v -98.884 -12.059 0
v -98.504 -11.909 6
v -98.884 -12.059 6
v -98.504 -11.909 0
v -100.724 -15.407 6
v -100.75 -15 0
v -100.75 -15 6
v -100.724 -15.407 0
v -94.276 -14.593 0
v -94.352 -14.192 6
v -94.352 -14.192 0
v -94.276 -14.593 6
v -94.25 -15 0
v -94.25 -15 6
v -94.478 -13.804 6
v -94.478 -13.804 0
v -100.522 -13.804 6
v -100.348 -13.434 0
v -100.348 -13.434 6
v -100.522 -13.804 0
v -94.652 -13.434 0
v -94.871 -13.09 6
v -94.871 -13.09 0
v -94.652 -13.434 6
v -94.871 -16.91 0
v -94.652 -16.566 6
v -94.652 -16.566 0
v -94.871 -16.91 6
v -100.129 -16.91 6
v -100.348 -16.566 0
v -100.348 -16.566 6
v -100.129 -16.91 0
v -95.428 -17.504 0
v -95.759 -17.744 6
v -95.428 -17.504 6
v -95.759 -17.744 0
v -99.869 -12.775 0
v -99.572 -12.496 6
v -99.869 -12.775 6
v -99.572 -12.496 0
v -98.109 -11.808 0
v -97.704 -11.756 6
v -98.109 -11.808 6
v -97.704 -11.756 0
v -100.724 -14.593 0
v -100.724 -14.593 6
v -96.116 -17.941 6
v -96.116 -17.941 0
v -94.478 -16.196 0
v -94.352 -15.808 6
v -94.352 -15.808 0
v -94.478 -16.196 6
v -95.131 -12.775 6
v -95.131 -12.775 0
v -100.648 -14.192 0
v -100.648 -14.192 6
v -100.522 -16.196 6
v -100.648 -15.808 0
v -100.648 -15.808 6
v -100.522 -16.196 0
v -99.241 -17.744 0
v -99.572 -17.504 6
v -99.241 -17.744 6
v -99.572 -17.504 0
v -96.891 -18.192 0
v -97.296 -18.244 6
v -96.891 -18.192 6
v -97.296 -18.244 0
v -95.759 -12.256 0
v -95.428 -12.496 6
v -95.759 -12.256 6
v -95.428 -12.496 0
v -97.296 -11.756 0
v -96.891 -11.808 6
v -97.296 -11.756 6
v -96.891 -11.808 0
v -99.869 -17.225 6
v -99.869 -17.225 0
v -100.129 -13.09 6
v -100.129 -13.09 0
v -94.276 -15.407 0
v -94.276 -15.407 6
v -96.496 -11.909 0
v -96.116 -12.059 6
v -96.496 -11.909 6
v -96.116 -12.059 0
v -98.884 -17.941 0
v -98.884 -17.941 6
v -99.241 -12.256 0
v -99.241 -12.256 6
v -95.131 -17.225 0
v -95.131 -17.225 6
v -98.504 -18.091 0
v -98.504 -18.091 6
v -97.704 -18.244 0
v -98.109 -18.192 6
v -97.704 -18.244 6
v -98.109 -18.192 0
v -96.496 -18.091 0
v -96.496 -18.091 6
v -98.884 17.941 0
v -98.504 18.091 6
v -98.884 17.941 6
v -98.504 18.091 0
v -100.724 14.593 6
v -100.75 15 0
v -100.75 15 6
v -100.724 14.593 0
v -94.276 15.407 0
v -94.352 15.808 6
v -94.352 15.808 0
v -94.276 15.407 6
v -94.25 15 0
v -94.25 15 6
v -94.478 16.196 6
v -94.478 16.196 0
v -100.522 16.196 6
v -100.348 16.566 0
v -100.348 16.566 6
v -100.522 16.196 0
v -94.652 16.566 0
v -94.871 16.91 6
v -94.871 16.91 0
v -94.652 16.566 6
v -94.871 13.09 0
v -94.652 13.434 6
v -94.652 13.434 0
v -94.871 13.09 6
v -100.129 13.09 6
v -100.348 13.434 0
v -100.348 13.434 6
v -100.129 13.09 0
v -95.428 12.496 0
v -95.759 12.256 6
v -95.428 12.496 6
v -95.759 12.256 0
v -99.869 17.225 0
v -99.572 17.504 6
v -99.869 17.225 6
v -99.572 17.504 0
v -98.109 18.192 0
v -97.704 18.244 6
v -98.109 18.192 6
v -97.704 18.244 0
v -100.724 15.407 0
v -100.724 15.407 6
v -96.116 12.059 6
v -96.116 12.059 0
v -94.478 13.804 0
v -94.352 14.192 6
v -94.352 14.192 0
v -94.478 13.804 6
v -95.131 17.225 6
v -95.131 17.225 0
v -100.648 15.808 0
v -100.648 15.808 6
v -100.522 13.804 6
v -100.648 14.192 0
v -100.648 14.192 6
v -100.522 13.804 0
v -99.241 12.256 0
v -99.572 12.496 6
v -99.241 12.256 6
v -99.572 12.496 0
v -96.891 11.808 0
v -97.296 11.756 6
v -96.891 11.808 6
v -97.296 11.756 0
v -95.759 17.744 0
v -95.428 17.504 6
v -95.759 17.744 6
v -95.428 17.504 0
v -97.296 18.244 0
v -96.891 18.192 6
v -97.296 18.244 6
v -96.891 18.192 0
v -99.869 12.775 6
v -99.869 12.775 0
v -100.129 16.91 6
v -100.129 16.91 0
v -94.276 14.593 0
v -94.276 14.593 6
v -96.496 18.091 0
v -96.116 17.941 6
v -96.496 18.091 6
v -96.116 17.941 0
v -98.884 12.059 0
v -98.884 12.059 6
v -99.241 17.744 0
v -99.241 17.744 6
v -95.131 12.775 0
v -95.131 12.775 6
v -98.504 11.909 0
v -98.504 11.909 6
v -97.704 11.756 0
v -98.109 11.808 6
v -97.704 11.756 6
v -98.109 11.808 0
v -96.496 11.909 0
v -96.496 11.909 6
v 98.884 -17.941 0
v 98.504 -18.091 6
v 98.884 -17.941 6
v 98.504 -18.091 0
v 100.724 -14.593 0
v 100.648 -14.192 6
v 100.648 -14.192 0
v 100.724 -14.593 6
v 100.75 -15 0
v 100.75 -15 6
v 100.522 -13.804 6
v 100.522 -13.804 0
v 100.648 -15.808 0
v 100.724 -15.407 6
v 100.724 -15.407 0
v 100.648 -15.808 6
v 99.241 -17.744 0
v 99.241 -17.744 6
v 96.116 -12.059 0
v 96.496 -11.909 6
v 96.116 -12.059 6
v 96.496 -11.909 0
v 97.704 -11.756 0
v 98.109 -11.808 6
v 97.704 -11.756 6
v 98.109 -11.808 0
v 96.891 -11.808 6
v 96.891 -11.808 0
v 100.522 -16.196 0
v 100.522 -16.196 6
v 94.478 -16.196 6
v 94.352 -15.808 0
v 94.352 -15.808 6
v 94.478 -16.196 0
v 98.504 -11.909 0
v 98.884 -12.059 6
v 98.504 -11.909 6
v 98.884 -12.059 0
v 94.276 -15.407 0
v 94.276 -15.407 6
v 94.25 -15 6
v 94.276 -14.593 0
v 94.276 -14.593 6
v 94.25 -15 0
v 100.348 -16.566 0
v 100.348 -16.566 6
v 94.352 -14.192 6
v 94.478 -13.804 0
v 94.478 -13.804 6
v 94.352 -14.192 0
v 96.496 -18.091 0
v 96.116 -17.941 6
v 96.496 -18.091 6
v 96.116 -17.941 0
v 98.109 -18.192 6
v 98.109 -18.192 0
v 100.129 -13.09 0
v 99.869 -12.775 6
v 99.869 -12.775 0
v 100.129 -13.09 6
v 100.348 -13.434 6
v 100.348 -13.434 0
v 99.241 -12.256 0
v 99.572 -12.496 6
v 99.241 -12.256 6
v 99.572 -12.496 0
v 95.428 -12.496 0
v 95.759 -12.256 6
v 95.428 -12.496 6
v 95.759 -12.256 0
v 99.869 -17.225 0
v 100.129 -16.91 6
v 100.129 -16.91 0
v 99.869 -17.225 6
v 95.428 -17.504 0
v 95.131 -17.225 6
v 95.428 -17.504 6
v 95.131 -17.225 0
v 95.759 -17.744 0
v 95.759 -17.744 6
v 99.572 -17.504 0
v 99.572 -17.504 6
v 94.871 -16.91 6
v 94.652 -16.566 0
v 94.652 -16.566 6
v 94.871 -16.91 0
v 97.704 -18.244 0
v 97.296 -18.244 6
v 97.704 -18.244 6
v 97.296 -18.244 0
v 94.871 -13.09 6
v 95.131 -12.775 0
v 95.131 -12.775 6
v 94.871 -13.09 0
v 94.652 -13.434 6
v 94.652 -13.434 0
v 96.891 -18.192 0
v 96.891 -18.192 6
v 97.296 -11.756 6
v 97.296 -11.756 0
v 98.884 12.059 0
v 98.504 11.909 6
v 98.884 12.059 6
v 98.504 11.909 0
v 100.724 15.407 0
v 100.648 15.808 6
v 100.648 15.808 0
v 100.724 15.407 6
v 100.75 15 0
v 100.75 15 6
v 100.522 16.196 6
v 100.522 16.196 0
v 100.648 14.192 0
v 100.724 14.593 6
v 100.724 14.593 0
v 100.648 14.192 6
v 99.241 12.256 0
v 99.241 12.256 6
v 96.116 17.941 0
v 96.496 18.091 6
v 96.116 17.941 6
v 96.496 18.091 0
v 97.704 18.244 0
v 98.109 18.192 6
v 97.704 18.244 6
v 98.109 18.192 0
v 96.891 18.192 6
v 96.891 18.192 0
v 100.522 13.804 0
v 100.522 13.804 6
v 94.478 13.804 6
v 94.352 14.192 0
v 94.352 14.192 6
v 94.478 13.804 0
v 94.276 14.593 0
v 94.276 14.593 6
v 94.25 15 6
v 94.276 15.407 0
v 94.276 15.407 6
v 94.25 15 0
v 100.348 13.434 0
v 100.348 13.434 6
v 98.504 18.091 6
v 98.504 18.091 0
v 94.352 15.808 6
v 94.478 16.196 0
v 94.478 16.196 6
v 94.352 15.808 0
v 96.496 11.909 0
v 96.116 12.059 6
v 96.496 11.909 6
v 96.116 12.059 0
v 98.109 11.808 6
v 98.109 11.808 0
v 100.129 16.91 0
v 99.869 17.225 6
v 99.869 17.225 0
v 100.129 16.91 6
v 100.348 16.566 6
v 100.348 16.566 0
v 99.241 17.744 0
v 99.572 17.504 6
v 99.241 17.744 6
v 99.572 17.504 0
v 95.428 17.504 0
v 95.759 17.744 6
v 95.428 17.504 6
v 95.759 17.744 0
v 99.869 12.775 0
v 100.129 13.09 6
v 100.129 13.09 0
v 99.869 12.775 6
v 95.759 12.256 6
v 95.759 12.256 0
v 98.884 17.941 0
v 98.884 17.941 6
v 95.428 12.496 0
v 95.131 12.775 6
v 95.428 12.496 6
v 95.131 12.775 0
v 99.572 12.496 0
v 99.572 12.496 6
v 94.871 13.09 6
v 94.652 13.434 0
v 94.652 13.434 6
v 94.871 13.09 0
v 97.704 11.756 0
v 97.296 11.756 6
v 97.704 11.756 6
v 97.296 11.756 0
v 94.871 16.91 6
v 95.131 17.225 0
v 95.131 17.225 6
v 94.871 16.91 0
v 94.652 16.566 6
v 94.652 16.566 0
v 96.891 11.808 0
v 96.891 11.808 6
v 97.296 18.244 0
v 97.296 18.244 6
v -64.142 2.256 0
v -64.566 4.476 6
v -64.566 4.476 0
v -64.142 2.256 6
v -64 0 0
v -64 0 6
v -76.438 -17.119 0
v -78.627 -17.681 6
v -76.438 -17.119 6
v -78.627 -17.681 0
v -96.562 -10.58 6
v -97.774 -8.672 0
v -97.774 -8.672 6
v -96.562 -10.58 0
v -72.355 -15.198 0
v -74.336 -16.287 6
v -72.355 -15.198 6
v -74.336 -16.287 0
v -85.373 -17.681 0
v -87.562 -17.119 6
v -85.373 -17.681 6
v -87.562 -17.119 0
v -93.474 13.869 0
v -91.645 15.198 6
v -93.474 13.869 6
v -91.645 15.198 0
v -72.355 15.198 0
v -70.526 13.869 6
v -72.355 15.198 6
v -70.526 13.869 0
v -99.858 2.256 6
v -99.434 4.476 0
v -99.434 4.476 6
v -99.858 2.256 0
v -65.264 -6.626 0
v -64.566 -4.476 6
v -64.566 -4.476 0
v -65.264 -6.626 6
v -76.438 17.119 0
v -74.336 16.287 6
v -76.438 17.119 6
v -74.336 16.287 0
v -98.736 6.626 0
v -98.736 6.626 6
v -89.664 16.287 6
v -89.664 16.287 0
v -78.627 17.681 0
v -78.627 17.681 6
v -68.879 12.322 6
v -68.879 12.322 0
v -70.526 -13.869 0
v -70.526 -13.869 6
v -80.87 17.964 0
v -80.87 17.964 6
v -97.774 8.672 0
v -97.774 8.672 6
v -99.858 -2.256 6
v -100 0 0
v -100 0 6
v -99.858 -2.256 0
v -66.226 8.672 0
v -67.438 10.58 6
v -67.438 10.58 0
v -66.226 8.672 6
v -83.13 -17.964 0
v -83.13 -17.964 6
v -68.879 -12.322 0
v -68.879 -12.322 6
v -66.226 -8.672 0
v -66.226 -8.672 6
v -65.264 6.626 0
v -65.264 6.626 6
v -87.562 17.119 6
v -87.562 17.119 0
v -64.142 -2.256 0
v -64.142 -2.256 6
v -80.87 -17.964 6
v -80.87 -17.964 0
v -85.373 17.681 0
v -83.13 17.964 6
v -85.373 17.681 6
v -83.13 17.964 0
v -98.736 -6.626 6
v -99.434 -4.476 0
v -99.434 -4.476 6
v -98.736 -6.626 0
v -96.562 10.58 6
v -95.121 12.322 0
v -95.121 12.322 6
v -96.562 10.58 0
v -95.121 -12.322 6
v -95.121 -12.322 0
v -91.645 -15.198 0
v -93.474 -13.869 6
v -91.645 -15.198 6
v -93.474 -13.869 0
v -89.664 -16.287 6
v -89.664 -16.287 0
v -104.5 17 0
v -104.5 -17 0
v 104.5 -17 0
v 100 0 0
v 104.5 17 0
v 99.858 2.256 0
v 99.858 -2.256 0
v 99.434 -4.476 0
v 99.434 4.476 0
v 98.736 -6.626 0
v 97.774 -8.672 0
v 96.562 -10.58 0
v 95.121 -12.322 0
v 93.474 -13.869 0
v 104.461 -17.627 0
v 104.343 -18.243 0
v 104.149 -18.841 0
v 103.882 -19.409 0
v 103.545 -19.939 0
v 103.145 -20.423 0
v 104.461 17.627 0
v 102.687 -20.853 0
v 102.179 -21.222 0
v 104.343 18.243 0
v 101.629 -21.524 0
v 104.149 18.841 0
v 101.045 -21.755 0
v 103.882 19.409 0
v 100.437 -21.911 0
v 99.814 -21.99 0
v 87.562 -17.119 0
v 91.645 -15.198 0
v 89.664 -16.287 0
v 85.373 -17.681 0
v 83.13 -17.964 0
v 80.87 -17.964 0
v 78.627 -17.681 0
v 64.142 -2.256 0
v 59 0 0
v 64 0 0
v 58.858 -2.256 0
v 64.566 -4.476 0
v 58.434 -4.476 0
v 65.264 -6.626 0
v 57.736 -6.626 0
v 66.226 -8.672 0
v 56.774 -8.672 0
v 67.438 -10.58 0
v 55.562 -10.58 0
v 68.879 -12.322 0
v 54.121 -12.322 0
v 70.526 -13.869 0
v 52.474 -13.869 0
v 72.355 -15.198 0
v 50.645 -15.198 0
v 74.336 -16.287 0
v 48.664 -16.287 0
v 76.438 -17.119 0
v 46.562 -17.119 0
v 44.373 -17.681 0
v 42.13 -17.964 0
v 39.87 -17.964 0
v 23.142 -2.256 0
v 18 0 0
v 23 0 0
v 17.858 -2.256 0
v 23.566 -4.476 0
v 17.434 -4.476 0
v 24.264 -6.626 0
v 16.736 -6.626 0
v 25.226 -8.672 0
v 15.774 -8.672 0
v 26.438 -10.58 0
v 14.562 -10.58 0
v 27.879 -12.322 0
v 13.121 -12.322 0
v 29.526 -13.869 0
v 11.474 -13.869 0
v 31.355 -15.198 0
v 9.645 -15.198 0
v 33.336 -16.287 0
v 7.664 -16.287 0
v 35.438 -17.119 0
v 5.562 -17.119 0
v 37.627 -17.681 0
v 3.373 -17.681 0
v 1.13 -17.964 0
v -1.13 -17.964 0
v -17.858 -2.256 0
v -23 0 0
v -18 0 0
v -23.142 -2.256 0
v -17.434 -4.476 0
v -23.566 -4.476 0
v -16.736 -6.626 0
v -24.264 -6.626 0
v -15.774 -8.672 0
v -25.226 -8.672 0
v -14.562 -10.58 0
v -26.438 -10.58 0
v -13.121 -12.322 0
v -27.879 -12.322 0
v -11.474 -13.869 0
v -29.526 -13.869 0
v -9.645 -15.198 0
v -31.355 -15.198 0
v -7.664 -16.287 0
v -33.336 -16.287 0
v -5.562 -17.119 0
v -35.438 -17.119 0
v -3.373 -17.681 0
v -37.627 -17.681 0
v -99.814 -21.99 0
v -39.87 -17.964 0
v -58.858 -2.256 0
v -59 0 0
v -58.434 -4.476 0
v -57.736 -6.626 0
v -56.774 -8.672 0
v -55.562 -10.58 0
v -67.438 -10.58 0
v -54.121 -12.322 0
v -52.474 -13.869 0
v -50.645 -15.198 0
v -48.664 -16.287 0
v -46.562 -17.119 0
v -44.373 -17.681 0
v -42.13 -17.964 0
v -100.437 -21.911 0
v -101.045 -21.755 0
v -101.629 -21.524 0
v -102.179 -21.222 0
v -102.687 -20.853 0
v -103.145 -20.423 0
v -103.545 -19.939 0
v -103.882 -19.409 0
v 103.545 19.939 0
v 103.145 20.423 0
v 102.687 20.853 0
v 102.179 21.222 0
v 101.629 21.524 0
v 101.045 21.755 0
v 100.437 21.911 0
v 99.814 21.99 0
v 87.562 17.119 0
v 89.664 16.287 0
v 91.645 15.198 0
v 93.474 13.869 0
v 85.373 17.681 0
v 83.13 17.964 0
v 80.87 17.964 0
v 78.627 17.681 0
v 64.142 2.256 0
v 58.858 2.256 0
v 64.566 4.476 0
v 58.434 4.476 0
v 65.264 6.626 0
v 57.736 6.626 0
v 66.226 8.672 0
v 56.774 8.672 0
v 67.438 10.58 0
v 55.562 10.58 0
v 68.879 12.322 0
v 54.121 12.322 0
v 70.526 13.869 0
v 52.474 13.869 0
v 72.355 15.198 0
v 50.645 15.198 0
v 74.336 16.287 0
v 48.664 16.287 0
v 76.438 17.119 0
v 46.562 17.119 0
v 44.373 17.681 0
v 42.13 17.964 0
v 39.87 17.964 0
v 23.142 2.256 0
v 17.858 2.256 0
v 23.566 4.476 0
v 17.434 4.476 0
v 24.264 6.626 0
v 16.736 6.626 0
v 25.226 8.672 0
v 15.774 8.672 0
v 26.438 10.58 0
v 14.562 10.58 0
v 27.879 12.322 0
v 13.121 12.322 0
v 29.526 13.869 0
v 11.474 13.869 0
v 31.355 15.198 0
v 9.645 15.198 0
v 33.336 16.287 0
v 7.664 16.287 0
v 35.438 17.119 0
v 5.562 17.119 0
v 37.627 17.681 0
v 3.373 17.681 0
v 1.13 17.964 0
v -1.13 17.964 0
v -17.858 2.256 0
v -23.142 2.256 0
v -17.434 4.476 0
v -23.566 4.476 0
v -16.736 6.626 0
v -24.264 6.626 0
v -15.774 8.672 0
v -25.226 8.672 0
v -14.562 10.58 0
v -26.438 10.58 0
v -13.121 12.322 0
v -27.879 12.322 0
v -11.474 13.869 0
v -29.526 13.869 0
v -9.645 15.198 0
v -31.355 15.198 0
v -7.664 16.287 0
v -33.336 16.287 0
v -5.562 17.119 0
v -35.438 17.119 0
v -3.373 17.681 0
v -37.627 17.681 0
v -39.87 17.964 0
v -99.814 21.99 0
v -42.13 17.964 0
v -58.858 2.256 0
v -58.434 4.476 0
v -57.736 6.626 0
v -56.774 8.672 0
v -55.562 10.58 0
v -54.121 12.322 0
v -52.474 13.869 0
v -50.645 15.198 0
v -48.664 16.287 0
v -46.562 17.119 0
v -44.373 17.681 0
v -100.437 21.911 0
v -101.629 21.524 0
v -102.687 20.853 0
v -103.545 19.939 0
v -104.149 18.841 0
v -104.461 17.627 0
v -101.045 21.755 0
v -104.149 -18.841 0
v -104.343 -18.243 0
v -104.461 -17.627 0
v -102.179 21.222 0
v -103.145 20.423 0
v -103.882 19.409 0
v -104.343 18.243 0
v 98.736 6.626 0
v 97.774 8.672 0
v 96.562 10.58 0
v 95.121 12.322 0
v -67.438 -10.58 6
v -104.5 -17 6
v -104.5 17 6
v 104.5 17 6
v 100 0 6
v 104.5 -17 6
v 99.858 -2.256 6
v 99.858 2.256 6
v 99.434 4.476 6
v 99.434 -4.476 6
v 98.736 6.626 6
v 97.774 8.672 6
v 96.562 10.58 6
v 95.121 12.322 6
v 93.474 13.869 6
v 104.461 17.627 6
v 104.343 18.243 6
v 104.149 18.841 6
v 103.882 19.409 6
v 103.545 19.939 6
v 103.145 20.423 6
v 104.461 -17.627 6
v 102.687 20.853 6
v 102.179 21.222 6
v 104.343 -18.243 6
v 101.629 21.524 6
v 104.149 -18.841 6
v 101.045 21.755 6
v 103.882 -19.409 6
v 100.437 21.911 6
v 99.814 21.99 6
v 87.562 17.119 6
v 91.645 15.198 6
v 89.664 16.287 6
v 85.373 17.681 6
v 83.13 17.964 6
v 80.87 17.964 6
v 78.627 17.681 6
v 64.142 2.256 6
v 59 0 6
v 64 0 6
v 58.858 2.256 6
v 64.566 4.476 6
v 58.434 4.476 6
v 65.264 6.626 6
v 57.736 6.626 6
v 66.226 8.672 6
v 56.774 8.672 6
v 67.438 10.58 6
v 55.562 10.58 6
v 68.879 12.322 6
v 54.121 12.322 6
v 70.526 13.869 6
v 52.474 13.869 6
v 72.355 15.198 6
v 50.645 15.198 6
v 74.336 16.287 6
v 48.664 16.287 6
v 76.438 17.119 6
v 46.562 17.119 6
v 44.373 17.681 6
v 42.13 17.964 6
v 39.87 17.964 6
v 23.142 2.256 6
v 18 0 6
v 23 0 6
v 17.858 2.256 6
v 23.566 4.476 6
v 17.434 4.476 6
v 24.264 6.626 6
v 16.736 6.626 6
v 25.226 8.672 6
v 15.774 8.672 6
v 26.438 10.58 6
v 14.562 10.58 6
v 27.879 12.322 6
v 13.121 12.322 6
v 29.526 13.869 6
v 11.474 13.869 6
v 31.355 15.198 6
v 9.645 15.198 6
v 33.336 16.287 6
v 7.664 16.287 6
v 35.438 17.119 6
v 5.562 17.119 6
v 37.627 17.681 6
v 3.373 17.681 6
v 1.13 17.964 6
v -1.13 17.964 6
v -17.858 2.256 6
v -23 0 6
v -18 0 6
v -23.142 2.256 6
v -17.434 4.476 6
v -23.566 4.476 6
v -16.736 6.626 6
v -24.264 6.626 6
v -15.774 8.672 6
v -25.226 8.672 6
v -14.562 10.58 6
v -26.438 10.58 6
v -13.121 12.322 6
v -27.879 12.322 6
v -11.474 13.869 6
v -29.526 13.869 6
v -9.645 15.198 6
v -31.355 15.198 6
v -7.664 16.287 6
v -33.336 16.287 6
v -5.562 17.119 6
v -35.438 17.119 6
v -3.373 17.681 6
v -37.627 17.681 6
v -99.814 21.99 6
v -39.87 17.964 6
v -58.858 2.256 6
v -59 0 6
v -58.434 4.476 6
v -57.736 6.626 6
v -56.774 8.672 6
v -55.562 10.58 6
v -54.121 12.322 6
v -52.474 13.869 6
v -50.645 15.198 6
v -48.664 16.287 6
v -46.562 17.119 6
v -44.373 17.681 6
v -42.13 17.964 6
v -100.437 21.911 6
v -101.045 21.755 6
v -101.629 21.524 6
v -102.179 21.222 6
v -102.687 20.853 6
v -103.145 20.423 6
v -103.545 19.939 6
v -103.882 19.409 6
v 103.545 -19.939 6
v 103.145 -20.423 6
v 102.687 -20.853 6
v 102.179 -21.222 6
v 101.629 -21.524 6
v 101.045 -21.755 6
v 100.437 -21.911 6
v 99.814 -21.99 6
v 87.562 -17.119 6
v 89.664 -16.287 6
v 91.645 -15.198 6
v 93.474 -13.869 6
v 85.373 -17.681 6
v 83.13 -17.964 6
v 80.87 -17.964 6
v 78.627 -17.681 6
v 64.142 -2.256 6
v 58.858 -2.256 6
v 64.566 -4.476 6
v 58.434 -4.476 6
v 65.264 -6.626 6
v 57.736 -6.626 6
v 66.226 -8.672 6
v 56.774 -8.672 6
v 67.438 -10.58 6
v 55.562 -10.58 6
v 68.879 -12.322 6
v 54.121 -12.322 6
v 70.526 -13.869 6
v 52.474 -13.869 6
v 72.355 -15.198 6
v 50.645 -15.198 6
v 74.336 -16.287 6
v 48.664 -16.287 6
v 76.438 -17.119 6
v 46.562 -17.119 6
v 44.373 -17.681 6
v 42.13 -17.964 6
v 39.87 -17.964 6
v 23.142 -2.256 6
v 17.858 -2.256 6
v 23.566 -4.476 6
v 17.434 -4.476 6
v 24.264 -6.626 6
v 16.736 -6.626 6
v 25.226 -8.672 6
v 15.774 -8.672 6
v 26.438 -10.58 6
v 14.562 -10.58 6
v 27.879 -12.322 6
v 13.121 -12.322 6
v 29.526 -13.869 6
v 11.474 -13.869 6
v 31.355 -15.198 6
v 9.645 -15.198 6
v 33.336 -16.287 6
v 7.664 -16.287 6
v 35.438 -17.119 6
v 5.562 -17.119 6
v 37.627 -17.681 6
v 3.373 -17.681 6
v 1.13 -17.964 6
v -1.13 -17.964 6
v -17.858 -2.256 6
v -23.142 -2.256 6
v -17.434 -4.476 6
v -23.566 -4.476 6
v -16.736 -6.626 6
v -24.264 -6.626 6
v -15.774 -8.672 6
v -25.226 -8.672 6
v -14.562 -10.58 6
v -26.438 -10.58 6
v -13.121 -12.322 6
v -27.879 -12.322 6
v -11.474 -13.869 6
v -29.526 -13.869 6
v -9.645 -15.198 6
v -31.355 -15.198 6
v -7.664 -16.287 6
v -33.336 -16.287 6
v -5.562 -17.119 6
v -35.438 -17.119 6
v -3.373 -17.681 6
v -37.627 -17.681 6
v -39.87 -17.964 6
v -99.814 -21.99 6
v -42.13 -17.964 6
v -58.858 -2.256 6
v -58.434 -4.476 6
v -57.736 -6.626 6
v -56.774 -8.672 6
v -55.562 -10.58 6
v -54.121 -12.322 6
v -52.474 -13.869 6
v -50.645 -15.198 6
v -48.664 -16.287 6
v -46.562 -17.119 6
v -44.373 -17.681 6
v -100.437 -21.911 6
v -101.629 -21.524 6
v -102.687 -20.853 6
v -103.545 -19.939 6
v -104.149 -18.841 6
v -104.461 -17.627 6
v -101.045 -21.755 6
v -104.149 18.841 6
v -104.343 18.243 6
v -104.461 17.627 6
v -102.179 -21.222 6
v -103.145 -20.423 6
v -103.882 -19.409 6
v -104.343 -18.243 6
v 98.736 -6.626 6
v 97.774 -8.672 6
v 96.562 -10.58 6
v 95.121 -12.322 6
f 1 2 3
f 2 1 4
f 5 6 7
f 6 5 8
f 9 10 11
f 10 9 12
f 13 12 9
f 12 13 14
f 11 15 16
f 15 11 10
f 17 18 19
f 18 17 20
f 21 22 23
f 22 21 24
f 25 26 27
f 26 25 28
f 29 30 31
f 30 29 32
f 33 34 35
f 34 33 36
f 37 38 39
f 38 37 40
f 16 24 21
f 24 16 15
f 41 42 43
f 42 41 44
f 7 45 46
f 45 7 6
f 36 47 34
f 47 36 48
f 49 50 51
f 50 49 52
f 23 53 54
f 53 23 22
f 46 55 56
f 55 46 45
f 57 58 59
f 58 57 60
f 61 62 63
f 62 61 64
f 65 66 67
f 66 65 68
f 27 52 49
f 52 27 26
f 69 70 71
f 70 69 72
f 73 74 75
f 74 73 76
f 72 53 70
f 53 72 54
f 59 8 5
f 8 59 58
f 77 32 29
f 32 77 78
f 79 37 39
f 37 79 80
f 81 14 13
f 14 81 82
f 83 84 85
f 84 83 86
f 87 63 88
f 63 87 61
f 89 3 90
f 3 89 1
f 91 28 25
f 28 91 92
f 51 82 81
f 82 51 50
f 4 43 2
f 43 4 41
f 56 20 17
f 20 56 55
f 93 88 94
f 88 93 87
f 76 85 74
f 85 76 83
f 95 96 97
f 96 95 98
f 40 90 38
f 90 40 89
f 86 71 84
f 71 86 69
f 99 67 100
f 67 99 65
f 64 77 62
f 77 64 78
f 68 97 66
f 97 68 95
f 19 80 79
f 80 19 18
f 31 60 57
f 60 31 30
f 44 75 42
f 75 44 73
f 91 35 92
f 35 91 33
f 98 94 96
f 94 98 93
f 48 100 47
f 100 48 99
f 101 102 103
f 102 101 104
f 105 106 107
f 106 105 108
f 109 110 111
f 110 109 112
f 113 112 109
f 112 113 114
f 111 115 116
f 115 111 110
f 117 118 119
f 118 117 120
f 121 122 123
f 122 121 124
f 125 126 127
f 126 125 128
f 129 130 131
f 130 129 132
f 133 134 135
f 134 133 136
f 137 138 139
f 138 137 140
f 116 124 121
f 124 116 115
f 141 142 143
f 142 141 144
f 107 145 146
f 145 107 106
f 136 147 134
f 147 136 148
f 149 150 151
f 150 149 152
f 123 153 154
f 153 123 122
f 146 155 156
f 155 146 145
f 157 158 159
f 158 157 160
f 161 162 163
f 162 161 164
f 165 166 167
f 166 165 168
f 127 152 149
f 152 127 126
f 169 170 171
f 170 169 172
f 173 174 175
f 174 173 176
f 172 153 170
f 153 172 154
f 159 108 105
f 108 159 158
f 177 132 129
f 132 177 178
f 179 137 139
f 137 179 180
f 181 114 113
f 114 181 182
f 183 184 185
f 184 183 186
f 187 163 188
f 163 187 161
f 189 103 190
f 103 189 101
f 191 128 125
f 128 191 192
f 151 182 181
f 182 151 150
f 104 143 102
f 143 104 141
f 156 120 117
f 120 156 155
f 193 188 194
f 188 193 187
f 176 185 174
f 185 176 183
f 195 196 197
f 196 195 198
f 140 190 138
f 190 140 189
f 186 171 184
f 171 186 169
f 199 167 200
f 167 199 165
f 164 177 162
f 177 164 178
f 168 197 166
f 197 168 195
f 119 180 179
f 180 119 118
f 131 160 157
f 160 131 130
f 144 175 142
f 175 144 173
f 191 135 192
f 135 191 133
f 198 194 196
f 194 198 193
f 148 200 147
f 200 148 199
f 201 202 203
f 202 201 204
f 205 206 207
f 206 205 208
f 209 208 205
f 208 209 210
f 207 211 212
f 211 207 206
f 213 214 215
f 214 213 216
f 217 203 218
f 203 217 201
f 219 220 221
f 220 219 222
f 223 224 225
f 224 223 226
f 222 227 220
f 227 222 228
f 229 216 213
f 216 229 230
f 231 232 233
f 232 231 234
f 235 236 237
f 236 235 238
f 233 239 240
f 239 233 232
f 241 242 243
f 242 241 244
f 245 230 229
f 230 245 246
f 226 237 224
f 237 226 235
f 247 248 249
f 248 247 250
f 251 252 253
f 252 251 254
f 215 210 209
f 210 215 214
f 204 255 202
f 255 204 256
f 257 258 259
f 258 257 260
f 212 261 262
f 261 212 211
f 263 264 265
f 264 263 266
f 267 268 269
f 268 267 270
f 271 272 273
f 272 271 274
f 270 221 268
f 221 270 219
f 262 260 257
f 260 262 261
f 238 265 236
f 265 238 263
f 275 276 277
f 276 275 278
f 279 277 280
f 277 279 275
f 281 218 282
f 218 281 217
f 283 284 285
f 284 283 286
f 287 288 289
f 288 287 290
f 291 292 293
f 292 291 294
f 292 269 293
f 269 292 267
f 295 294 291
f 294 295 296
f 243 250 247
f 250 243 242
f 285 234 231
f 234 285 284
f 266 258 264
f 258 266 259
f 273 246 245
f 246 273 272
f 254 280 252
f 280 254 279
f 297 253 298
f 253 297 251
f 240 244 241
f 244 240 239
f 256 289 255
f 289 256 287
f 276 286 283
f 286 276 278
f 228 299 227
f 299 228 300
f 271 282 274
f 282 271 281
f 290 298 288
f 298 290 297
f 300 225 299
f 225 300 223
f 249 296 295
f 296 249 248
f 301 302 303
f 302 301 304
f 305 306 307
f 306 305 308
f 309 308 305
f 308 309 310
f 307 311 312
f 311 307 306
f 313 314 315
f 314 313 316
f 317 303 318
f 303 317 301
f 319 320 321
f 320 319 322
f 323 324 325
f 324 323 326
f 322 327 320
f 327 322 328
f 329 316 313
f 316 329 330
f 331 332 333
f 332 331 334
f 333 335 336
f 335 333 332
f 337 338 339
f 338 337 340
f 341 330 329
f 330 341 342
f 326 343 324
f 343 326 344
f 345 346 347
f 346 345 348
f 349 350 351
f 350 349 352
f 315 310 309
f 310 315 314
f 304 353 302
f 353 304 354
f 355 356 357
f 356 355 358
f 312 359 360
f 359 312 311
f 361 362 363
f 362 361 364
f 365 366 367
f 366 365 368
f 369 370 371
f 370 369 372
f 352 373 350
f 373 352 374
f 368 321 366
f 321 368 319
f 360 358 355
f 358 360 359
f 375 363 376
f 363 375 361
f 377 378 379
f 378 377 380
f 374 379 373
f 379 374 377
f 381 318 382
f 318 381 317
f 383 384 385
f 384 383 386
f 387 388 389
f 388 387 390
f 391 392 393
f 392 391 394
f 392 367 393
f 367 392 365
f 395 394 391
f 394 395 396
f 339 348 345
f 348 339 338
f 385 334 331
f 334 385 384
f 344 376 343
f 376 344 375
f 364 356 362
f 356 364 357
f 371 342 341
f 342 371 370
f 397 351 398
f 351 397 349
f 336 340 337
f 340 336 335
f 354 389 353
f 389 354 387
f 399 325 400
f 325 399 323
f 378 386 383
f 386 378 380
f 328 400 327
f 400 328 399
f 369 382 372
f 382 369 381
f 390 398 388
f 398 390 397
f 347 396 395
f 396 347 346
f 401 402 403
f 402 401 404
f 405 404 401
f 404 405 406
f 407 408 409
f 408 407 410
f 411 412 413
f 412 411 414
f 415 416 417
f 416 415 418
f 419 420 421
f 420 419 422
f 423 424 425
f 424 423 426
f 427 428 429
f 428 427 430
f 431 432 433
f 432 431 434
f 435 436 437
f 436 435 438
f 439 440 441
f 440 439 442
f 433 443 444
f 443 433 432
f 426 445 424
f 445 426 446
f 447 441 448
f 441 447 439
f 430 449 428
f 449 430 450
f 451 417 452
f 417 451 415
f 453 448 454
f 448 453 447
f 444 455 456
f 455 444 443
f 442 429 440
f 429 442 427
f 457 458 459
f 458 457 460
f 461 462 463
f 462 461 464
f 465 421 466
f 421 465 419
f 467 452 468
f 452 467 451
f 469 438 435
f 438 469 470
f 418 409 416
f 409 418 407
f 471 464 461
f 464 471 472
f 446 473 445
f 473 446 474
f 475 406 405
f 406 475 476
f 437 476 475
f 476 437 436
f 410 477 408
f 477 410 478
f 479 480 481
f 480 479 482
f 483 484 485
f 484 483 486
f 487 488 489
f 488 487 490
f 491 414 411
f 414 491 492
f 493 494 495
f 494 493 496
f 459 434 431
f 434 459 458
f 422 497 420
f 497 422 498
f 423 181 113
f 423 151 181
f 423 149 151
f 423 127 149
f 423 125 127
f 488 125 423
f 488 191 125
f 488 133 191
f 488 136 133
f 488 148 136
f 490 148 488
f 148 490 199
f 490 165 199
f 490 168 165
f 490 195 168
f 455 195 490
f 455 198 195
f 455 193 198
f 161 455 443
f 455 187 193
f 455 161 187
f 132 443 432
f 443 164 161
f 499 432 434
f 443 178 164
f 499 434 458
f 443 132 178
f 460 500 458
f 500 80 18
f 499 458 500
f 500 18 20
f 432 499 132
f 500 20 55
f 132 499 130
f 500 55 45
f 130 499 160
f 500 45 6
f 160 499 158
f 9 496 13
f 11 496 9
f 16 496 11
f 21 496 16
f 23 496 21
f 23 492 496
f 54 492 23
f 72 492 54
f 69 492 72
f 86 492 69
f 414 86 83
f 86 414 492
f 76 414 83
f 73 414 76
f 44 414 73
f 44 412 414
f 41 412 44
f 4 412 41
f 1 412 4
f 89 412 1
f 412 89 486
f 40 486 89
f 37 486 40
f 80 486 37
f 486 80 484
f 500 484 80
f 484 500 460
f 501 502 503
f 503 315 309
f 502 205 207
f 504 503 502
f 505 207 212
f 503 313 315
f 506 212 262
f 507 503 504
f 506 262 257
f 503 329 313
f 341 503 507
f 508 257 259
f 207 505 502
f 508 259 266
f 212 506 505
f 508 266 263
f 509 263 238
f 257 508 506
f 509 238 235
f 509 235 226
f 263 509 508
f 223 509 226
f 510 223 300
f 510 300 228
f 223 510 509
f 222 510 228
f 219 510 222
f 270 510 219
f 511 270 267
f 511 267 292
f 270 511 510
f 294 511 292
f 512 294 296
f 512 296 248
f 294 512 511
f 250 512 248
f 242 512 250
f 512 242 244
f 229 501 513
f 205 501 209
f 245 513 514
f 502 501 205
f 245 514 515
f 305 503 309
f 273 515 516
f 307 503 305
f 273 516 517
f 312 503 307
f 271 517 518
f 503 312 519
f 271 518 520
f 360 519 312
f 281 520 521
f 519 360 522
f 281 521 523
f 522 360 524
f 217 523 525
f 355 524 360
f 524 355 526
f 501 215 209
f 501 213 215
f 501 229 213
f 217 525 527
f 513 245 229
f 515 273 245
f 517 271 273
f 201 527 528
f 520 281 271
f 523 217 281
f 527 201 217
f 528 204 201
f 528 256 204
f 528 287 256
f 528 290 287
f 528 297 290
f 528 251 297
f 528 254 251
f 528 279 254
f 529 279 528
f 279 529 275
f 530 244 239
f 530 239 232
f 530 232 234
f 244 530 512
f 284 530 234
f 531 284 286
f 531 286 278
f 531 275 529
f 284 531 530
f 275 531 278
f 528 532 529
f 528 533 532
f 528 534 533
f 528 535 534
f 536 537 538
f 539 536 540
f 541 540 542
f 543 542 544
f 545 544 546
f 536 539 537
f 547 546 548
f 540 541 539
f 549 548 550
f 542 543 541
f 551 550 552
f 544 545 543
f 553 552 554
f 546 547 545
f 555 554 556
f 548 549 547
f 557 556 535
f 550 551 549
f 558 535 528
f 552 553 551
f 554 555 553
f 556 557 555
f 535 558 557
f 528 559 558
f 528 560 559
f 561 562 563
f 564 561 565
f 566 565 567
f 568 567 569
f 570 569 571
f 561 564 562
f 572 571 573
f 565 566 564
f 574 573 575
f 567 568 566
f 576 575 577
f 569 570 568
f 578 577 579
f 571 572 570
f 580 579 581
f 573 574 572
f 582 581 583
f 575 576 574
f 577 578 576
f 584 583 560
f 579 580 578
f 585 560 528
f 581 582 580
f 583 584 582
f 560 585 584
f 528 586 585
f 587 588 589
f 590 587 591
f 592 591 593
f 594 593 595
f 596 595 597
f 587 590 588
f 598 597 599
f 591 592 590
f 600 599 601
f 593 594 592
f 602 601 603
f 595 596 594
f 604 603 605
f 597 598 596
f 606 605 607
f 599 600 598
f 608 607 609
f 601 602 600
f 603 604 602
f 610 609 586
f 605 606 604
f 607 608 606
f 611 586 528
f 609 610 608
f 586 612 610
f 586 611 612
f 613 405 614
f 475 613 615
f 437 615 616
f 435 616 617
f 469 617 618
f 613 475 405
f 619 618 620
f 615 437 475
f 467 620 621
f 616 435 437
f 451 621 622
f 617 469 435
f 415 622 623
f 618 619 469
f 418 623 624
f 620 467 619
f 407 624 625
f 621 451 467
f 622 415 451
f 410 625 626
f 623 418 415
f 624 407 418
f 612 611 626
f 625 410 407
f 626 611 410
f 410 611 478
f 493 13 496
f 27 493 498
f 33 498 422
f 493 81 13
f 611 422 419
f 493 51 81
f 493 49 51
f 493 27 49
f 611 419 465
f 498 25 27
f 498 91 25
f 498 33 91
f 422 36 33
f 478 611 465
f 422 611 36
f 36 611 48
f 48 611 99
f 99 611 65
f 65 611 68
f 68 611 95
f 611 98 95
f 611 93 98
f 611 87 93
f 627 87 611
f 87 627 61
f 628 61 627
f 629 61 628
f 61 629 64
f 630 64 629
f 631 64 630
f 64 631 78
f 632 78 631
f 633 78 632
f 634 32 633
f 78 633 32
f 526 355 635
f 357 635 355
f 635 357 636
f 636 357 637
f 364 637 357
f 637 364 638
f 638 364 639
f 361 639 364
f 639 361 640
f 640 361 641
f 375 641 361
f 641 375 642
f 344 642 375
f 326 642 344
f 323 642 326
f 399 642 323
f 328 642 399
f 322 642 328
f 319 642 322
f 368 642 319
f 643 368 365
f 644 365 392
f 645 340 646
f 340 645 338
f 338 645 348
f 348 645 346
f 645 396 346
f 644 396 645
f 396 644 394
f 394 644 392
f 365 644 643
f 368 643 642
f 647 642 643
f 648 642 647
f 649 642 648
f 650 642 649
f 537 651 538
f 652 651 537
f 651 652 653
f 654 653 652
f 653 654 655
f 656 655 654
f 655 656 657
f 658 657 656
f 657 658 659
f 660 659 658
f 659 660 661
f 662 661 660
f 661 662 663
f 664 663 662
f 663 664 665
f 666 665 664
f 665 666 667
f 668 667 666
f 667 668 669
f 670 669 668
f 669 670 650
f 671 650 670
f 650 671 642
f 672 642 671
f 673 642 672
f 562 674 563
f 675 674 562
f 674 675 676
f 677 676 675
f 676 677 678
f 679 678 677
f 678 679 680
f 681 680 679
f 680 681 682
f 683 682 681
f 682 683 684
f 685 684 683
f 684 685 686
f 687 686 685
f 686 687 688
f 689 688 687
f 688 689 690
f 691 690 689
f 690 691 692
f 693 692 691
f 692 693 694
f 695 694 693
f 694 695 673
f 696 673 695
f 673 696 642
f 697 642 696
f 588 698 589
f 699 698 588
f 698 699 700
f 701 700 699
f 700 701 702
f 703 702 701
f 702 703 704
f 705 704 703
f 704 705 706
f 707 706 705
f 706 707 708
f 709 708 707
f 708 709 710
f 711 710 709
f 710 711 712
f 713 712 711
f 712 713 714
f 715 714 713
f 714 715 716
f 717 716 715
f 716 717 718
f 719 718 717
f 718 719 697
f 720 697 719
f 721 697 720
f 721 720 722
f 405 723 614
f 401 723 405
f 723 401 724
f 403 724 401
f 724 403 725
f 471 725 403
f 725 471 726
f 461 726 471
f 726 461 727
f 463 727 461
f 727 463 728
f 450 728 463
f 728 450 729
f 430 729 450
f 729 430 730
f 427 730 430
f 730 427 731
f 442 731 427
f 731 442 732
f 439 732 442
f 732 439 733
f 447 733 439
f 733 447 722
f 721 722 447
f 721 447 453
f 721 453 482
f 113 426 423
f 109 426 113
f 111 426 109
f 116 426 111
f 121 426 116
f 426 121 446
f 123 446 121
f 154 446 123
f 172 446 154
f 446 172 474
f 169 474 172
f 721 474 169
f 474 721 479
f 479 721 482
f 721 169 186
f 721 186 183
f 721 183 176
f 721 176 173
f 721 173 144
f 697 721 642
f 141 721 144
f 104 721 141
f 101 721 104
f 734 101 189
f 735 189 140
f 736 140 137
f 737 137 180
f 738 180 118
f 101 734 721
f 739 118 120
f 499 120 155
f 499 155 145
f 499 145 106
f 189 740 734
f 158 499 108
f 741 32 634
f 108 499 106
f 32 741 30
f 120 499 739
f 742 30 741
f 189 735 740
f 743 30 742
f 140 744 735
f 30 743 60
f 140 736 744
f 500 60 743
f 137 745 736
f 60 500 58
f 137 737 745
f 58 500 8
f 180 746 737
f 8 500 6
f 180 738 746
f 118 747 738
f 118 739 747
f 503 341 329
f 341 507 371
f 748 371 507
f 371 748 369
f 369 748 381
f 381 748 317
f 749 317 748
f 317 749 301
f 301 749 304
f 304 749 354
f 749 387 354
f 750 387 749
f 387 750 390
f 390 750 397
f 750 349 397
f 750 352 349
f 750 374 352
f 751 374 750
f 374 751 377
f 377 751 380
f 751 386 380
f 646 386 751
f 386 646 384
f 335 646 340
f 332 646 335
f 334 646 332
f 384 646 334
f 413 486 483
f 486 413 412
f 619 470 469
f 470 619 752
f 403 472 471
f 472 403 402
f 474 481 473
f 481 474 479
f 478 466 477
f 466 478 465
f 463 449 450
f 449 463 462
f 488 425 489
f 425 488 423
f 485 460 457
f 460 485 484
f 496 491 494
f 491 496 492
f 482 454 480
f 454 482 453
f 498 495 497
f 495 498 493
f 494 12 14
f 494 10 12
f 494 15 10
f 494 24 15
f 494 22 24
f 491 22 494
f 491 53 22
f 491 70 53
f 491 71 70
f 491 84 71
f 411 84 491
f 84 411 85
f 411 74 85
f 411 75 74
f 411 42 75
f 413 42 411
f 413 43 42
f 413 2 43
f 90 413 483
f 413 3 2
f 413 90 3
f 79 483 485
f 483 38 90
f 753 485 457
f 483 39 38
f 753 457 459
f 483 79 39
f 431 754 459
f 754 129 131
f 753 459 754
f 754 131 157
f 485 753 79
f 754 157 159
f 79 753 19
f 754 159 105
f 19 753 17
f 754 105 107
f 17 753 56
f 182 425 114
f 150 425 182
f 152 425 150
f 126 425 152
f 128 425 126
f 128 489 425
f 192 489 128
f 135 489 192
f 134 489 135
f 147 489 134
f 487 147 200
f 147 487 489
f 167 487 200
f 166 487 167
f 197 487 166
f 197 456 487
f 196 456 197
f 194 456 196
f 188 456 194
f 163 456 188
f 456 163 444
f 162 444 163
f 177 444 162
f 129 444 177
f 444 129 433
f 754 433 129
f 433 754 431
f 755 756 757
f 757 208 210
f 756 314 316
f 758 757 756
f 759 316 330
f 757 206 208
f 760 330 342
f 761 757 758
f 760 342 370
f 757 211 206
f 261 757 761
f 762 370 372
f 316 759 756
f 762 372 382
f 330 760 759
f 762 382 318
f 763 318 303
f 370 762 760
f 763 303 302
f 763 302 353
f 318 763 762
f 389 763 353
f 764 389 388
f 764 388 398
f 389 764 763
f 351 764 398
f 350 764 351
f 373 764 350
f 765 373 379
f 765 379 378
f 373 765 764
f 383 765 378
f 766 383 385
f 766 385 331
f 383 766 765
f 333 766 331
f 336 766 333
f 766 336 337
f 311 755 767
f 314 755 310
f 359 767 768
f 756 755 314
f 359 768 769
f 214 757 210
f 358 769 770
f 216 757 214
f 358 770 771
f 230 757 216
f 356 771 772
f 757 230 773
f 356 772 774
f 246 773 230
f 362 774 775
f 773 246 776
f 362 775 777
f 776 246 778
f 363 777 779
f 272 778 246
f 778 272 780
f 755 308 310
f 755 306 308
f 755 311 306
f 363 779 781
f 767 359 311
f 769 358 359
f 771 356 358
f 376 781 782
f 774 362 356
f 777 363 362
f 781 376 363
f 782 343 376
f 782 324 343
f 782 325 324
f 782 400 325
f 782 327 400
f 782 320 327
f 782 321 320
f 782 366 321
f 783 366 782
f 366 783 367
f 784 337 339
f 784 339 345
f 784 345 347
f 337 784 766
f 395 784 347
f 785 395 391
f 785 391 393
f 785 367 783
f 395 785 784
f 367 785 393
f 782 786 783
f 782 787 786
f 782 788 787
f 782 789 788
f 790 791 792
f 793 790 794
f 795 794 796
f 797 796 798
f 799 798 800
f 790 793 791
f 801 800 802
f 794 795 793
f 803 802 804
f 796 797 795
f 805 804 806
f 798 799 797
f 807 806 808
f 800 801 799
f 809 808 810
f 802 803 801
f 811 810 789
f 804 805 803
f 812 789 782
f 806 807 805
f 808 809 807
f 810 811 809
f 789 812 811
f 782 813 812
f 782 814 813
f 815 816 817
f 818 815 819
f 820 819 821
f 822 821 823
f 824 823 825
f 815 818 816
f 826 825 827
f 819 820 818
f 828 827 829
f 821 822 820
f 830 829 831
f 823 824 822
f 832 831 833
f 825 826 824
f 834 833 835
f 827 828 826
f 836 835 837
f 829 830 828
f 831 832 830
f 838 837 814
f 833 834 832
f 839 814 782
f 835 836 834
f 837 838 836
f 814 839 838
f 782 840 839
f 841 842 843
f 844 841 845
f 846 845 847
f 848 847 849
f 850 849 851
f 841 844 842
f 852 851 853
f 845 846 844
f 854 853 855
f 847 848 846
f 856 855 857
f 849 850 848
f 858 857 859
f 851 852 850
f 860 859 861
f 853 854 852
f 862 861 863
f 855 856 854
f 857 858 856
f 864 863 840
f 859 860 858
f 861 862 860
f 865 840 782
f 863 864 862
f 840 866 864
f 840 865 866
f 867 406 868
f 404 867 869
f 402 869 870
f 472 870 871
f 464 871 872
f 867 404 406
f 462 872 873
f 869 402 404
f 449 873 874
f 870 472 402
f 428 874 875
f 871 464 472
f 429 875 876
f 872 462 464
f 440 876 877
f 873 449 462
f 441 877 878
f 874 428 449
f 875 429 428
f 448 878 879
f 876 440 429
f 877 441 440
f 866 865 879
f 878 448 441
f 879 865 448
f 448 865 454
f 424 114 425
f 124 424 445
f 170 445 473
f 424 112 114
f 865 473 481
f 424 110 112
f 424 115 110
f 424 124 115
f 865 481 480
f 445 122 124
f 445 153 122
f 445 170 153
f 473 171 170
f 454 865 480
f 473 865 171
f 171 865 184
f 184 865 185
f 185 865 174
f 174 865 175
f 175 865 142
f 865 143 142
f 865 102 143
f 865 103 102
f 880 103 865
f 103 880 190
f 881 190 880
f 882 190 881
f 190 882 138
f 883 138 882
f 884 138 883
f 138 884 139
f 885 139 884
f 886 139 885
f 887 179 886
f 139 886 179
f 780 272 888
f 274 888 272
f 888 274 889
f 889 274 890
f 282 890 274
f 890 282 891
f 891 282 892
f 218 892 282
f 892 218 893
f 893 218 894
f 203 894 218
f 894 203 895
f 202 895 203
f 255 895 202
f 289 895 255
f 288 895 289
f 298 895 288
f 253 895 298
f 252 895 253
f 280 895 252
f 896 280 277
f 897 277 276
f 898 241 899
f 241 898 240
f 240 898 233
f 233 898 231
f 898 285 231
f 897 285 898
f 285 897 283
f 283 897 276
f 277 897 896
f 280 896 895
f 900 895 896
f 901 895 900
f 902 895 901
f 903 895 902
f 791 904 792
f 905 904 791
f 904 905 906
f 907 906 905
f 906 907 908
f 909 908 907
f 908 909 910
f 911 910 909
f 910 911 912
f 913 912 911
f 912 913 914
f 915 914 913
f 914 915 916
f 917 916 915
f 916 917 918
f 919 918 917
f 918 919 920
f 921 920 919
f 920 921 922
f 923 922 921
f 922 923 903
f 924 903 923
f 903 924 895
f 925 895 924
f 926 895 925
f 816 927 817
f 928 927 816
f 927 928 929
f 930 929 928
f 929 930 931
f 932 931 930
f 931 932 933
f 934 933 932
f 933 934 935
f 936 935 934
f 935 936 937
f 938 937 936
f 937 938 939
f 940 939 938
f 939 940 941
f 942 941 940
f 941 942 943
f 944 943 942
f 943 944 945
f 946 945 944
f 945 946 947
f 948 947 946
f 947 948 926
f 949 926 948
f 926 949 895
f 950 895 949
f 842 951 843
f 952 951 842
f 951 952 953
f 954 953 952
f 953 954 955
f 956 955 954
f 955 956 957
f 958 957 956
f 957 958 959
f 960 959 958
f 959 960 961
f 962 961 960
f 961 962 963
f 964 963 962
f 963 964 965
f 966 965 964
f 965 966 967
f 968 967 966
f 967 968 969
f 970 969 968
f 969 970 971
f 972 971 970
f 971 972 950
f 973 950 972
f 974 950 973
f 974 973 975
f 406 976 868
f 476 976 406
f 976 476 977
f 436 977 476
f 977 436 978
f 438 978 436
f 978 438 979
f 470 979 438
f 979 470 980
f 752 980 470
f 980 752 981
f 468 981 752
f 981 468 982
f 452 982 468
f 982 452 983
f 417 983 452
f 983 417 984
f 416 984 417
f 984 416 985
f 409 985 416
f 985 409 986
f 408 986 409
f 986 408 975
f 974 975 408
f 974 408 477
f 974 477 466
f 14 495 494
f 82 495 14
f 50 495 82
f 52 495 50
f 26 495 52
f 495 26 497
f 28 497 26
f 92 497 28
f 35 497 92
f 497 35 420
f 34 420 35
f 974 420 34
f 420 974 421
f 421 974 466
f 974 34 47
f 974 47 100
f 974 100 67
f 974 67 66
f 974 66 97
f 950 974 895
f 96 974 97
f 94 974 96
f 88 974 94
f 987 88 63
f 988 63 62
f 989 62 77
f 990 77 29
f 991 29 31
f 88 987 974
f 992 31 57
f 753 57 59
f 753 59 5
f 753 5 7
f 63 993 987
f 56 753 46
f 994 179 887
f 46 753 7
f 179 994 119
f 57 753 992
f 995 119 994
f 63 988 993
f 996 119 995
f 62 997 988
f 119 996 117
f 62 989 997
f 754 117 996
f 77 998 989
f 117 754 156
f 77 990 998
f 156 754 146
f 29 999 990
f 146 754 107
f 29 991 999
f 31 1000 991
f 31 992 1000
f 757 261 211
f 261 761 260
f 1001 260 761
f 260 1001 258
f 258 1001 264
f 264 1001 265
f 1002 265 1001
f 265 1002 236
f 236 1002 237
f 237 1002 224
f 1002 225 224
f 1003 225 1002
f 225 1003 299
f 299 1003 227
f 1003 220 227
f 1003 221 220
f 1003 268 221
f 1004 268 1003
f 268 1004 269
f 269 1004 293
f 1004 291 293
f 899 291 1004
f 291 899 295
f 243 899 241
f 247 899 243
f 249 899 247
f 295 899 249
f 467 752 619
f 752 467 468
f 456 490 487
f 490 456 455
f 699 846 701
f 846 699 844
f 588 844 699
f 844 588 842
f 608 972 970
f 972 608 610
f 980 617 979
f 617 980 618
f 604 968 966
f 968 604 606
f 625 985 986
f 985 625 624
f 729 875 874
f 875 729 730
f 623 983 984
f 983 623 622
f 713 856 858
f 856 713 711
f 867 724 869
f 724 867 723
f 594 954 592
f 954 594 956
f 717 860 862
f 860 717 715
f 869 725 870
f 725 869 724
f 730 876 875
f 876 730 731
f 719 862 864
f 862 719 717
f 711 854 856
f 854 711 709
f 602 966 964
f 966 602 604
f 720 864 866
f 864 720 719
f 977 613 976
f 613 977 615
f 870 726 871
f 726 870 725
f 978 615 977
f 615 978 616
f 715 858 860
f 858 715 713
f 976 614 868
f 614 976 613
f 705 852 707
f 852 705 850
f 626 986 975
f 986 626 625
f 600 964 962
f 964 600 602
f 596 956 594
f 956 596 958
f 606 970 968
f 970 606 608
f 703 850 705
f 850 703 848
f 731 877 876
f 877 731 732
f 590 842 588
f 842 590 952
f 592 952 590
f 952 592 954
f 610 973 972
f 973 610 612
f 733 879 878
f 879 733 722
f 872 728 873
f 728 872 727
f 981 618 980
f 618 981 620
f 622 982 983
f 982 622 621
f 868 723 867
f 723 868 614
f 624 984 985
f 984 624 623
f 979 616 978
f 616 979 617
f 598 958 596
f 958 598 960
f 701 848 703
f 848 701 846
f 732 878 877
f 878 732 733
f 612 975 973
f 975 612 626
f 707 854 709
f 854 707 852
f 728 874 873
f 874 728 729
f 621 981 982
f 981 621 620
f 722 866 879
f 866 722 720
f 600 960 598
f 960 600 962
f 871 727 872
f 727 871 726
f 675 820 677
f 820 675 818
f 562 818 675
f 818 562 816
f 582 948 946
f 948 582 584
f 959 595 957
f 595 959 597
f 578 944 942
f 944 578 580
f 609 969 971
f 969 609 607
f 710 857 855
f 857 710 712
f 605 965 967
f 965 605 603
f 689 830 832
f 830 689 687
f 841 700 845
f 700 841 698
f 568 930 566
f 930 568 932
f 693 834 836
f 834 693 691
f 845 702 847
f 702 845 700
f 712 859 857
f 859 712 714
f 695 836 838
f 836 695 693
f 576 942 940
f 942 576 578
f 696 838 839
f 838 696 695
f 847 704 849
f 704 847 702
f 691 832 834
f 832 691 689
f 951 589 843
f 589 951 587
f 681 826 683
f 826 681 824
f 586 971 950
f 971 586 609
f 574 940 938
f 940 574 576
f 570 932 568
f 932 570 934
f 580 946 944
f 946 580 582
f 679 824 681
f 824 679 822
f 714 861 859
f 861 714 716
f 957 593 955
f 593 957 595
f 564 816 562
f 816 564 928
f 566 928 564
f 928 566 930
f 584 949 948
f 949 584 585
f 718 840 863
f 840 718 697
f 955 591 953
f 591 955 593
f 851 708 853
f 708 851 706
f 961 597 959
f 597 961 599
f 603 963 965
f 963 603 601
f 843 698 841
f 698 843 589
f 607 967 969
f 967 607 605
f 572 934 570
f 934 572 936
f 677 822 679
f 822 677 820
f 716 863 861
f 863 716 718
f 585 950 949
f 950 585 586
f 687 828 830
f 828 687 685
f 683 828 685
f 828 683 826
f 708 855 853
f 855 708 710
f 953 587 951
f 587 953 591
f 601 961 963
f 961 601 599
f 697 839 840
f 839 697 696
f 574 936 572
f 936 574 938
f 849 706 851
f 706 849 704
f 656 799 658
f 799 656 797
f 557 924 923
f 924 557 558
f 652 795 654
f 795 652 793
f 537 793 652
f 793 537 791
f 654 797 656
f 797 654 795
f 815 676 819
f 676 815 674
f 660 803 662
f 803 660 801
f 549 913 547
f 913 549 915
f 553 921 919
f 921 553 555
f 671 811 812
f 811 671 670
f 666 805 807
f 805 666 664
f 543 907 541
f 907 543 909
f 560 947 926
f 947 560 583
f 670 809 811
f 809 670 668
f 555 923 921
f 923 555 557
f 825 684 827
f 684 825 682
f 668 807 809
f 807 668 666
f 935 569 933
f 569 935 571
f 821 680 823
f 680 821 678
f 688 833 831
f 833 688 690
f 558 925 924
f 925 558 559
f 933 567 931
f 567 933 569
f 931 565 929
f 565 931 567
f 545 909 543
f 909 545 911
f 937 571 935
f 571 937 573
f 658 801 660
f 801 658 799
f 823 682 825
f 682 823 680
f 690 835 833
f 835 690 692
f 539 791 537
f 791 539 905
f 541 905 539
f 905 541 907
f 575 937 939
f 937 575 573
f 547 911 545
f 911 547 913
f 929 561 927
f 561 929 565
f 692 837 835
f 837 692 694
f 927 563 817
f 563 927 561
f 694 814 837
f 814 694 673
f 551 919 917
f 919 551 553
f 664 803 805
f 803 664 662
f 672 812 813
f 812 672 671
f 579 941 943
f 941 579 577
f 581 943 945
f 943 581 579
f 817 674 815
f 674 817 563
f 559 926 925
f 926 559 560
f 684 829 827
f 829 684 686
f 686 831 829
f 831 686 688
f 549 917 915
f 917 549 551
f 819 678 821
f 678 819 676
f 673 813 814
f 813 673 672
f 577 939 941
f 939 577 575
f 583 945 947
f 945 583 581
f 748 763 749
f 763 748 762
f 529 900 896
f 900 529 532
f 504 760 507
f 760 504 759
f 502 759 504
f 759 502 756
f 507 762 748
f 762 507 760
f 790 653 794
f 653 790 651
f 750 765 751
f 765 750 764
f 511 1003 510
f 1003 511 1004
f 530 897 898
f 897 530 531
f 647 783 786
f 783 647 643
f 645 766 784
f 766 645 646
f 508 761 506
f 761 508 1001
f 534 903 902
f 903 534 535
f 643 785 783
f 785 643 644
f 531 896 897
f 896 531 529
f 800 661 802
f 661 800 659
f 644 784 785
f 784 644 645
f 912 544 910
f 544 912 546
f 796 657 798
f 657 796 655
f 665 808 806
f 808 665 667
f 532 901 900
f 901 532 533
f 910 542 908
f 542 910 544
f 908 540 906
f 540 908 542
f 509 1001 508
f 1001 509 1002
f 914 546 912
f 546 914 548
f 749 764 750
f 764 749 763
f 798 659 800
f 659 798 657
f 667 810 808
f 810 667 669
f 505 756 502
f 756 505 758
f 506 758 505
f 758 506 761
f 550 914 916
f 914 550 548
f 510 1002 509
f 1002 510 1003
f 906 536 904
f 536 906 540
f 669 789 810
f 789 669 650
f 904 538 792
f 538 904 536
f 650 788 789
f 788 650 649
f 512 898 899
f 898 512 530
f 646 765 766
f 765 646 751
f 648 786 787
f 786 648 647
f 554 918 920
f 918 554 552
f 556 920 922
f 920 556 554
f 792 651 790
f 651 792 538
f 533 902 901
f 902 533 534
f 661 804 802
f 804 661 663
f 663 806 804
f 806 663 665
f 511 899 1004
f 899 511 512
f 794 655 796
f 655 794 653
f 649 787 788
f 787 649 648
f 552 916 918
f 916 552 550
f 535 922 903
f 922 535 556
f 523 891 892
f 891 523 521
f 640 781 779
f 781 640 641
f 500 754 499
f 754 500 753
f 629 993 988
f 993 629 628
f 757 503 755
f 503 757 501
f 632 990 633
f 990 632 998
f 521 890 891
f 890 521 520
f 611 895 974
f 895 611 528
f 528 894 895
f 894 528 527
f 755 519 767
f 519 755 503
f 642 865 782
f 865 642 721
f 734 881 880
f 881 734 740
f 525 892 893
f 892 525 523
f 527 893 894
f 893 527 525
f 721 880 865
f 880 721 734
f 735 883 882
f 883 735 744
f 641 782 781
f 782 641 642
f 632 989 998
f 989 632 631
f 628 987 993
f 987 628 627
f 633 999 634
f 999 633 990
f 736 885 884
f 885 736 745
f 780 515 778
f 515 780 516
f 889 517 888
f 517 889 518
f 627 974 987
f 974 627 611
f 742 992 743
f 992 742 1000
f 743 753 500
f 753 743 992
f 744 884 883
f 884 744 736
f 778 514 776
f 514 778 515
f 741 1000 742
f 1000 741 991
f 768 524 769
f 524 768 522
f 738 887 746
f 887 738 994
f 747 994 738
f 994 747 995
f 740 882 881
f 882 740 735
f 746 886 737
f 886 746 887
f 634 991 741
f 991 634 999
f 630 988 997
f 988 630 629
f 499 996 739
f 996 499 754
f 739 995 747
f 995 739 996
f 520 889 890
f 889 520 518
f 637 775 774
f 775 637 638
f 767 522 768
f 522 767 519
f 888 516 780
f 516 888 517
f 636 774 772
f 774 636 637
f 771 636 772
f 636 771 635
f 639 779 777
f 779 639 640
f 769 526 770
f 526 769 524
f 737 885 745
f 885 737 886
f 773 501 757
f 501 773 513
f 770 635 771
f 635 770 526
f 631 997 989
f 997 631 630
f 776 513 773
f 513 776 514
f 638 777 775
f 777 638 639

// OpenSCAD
$fn = 50;


difference() {
	union() {
		hull() {
			translate(v = [-99.5000000000, 17.0000000000, 0]) {
				cylinder(h = 6, r = 5);
			}
			translate(v = [99.5000000000, 17.0000000000, 0]) {
				cylinder(h = 6, r = 5);
			}
			translate(v = [-99.5000000000, -17.0000000000, 0]) {
				cylinder(h = 6, r = 5);
			}
			translate(v = [99.5000000000, -17.0000000000, 0]) {
				cylinder(h = 6, r = 5);
			}
		}
	}
	union() {
		#translate(v = [-97.5000000000, -15.0000000000, -100.0000000000]) {
			cylinder(h = 200, r = 3.2500000000);
		}
		#translate(v = [-97.5000000000, 15.0000000000, -100.0000000000]) {
			cylinder(h = 200, r = 3.2500000000);
		}
		#translate(v = [97.5000000000, -15.0000000000, -100.0000000000]) {
			cylinder(h = 200, r = 3.2500000000);
		}
		#translate(v = [97.5000000000, 15.0000000000, -100.0000000000]) {
			cylinder(h = 200, r = 3.2500000000);
		}
		#translate(v = [-82.0000000000, 0, 0]) {
			cylinder(h = 6, r = 18.0000000000);
		}
		#translate(v = [-41.0000000000, 0, 0]) {
			cylinder(h = 6, r = 18.0000000000);
		}
		#cylinder(h = 6, r = 18.0000000000);
		#translate(v = [41.0000000000, 0, 0]) {
			cylinder(h = 6, r = 18.0000000000);
		}
		#translate(v = [82.0000000000, 0, 0]) {
			cylinder(h = 6, r = 18.0000000000);
		}
	}
}
